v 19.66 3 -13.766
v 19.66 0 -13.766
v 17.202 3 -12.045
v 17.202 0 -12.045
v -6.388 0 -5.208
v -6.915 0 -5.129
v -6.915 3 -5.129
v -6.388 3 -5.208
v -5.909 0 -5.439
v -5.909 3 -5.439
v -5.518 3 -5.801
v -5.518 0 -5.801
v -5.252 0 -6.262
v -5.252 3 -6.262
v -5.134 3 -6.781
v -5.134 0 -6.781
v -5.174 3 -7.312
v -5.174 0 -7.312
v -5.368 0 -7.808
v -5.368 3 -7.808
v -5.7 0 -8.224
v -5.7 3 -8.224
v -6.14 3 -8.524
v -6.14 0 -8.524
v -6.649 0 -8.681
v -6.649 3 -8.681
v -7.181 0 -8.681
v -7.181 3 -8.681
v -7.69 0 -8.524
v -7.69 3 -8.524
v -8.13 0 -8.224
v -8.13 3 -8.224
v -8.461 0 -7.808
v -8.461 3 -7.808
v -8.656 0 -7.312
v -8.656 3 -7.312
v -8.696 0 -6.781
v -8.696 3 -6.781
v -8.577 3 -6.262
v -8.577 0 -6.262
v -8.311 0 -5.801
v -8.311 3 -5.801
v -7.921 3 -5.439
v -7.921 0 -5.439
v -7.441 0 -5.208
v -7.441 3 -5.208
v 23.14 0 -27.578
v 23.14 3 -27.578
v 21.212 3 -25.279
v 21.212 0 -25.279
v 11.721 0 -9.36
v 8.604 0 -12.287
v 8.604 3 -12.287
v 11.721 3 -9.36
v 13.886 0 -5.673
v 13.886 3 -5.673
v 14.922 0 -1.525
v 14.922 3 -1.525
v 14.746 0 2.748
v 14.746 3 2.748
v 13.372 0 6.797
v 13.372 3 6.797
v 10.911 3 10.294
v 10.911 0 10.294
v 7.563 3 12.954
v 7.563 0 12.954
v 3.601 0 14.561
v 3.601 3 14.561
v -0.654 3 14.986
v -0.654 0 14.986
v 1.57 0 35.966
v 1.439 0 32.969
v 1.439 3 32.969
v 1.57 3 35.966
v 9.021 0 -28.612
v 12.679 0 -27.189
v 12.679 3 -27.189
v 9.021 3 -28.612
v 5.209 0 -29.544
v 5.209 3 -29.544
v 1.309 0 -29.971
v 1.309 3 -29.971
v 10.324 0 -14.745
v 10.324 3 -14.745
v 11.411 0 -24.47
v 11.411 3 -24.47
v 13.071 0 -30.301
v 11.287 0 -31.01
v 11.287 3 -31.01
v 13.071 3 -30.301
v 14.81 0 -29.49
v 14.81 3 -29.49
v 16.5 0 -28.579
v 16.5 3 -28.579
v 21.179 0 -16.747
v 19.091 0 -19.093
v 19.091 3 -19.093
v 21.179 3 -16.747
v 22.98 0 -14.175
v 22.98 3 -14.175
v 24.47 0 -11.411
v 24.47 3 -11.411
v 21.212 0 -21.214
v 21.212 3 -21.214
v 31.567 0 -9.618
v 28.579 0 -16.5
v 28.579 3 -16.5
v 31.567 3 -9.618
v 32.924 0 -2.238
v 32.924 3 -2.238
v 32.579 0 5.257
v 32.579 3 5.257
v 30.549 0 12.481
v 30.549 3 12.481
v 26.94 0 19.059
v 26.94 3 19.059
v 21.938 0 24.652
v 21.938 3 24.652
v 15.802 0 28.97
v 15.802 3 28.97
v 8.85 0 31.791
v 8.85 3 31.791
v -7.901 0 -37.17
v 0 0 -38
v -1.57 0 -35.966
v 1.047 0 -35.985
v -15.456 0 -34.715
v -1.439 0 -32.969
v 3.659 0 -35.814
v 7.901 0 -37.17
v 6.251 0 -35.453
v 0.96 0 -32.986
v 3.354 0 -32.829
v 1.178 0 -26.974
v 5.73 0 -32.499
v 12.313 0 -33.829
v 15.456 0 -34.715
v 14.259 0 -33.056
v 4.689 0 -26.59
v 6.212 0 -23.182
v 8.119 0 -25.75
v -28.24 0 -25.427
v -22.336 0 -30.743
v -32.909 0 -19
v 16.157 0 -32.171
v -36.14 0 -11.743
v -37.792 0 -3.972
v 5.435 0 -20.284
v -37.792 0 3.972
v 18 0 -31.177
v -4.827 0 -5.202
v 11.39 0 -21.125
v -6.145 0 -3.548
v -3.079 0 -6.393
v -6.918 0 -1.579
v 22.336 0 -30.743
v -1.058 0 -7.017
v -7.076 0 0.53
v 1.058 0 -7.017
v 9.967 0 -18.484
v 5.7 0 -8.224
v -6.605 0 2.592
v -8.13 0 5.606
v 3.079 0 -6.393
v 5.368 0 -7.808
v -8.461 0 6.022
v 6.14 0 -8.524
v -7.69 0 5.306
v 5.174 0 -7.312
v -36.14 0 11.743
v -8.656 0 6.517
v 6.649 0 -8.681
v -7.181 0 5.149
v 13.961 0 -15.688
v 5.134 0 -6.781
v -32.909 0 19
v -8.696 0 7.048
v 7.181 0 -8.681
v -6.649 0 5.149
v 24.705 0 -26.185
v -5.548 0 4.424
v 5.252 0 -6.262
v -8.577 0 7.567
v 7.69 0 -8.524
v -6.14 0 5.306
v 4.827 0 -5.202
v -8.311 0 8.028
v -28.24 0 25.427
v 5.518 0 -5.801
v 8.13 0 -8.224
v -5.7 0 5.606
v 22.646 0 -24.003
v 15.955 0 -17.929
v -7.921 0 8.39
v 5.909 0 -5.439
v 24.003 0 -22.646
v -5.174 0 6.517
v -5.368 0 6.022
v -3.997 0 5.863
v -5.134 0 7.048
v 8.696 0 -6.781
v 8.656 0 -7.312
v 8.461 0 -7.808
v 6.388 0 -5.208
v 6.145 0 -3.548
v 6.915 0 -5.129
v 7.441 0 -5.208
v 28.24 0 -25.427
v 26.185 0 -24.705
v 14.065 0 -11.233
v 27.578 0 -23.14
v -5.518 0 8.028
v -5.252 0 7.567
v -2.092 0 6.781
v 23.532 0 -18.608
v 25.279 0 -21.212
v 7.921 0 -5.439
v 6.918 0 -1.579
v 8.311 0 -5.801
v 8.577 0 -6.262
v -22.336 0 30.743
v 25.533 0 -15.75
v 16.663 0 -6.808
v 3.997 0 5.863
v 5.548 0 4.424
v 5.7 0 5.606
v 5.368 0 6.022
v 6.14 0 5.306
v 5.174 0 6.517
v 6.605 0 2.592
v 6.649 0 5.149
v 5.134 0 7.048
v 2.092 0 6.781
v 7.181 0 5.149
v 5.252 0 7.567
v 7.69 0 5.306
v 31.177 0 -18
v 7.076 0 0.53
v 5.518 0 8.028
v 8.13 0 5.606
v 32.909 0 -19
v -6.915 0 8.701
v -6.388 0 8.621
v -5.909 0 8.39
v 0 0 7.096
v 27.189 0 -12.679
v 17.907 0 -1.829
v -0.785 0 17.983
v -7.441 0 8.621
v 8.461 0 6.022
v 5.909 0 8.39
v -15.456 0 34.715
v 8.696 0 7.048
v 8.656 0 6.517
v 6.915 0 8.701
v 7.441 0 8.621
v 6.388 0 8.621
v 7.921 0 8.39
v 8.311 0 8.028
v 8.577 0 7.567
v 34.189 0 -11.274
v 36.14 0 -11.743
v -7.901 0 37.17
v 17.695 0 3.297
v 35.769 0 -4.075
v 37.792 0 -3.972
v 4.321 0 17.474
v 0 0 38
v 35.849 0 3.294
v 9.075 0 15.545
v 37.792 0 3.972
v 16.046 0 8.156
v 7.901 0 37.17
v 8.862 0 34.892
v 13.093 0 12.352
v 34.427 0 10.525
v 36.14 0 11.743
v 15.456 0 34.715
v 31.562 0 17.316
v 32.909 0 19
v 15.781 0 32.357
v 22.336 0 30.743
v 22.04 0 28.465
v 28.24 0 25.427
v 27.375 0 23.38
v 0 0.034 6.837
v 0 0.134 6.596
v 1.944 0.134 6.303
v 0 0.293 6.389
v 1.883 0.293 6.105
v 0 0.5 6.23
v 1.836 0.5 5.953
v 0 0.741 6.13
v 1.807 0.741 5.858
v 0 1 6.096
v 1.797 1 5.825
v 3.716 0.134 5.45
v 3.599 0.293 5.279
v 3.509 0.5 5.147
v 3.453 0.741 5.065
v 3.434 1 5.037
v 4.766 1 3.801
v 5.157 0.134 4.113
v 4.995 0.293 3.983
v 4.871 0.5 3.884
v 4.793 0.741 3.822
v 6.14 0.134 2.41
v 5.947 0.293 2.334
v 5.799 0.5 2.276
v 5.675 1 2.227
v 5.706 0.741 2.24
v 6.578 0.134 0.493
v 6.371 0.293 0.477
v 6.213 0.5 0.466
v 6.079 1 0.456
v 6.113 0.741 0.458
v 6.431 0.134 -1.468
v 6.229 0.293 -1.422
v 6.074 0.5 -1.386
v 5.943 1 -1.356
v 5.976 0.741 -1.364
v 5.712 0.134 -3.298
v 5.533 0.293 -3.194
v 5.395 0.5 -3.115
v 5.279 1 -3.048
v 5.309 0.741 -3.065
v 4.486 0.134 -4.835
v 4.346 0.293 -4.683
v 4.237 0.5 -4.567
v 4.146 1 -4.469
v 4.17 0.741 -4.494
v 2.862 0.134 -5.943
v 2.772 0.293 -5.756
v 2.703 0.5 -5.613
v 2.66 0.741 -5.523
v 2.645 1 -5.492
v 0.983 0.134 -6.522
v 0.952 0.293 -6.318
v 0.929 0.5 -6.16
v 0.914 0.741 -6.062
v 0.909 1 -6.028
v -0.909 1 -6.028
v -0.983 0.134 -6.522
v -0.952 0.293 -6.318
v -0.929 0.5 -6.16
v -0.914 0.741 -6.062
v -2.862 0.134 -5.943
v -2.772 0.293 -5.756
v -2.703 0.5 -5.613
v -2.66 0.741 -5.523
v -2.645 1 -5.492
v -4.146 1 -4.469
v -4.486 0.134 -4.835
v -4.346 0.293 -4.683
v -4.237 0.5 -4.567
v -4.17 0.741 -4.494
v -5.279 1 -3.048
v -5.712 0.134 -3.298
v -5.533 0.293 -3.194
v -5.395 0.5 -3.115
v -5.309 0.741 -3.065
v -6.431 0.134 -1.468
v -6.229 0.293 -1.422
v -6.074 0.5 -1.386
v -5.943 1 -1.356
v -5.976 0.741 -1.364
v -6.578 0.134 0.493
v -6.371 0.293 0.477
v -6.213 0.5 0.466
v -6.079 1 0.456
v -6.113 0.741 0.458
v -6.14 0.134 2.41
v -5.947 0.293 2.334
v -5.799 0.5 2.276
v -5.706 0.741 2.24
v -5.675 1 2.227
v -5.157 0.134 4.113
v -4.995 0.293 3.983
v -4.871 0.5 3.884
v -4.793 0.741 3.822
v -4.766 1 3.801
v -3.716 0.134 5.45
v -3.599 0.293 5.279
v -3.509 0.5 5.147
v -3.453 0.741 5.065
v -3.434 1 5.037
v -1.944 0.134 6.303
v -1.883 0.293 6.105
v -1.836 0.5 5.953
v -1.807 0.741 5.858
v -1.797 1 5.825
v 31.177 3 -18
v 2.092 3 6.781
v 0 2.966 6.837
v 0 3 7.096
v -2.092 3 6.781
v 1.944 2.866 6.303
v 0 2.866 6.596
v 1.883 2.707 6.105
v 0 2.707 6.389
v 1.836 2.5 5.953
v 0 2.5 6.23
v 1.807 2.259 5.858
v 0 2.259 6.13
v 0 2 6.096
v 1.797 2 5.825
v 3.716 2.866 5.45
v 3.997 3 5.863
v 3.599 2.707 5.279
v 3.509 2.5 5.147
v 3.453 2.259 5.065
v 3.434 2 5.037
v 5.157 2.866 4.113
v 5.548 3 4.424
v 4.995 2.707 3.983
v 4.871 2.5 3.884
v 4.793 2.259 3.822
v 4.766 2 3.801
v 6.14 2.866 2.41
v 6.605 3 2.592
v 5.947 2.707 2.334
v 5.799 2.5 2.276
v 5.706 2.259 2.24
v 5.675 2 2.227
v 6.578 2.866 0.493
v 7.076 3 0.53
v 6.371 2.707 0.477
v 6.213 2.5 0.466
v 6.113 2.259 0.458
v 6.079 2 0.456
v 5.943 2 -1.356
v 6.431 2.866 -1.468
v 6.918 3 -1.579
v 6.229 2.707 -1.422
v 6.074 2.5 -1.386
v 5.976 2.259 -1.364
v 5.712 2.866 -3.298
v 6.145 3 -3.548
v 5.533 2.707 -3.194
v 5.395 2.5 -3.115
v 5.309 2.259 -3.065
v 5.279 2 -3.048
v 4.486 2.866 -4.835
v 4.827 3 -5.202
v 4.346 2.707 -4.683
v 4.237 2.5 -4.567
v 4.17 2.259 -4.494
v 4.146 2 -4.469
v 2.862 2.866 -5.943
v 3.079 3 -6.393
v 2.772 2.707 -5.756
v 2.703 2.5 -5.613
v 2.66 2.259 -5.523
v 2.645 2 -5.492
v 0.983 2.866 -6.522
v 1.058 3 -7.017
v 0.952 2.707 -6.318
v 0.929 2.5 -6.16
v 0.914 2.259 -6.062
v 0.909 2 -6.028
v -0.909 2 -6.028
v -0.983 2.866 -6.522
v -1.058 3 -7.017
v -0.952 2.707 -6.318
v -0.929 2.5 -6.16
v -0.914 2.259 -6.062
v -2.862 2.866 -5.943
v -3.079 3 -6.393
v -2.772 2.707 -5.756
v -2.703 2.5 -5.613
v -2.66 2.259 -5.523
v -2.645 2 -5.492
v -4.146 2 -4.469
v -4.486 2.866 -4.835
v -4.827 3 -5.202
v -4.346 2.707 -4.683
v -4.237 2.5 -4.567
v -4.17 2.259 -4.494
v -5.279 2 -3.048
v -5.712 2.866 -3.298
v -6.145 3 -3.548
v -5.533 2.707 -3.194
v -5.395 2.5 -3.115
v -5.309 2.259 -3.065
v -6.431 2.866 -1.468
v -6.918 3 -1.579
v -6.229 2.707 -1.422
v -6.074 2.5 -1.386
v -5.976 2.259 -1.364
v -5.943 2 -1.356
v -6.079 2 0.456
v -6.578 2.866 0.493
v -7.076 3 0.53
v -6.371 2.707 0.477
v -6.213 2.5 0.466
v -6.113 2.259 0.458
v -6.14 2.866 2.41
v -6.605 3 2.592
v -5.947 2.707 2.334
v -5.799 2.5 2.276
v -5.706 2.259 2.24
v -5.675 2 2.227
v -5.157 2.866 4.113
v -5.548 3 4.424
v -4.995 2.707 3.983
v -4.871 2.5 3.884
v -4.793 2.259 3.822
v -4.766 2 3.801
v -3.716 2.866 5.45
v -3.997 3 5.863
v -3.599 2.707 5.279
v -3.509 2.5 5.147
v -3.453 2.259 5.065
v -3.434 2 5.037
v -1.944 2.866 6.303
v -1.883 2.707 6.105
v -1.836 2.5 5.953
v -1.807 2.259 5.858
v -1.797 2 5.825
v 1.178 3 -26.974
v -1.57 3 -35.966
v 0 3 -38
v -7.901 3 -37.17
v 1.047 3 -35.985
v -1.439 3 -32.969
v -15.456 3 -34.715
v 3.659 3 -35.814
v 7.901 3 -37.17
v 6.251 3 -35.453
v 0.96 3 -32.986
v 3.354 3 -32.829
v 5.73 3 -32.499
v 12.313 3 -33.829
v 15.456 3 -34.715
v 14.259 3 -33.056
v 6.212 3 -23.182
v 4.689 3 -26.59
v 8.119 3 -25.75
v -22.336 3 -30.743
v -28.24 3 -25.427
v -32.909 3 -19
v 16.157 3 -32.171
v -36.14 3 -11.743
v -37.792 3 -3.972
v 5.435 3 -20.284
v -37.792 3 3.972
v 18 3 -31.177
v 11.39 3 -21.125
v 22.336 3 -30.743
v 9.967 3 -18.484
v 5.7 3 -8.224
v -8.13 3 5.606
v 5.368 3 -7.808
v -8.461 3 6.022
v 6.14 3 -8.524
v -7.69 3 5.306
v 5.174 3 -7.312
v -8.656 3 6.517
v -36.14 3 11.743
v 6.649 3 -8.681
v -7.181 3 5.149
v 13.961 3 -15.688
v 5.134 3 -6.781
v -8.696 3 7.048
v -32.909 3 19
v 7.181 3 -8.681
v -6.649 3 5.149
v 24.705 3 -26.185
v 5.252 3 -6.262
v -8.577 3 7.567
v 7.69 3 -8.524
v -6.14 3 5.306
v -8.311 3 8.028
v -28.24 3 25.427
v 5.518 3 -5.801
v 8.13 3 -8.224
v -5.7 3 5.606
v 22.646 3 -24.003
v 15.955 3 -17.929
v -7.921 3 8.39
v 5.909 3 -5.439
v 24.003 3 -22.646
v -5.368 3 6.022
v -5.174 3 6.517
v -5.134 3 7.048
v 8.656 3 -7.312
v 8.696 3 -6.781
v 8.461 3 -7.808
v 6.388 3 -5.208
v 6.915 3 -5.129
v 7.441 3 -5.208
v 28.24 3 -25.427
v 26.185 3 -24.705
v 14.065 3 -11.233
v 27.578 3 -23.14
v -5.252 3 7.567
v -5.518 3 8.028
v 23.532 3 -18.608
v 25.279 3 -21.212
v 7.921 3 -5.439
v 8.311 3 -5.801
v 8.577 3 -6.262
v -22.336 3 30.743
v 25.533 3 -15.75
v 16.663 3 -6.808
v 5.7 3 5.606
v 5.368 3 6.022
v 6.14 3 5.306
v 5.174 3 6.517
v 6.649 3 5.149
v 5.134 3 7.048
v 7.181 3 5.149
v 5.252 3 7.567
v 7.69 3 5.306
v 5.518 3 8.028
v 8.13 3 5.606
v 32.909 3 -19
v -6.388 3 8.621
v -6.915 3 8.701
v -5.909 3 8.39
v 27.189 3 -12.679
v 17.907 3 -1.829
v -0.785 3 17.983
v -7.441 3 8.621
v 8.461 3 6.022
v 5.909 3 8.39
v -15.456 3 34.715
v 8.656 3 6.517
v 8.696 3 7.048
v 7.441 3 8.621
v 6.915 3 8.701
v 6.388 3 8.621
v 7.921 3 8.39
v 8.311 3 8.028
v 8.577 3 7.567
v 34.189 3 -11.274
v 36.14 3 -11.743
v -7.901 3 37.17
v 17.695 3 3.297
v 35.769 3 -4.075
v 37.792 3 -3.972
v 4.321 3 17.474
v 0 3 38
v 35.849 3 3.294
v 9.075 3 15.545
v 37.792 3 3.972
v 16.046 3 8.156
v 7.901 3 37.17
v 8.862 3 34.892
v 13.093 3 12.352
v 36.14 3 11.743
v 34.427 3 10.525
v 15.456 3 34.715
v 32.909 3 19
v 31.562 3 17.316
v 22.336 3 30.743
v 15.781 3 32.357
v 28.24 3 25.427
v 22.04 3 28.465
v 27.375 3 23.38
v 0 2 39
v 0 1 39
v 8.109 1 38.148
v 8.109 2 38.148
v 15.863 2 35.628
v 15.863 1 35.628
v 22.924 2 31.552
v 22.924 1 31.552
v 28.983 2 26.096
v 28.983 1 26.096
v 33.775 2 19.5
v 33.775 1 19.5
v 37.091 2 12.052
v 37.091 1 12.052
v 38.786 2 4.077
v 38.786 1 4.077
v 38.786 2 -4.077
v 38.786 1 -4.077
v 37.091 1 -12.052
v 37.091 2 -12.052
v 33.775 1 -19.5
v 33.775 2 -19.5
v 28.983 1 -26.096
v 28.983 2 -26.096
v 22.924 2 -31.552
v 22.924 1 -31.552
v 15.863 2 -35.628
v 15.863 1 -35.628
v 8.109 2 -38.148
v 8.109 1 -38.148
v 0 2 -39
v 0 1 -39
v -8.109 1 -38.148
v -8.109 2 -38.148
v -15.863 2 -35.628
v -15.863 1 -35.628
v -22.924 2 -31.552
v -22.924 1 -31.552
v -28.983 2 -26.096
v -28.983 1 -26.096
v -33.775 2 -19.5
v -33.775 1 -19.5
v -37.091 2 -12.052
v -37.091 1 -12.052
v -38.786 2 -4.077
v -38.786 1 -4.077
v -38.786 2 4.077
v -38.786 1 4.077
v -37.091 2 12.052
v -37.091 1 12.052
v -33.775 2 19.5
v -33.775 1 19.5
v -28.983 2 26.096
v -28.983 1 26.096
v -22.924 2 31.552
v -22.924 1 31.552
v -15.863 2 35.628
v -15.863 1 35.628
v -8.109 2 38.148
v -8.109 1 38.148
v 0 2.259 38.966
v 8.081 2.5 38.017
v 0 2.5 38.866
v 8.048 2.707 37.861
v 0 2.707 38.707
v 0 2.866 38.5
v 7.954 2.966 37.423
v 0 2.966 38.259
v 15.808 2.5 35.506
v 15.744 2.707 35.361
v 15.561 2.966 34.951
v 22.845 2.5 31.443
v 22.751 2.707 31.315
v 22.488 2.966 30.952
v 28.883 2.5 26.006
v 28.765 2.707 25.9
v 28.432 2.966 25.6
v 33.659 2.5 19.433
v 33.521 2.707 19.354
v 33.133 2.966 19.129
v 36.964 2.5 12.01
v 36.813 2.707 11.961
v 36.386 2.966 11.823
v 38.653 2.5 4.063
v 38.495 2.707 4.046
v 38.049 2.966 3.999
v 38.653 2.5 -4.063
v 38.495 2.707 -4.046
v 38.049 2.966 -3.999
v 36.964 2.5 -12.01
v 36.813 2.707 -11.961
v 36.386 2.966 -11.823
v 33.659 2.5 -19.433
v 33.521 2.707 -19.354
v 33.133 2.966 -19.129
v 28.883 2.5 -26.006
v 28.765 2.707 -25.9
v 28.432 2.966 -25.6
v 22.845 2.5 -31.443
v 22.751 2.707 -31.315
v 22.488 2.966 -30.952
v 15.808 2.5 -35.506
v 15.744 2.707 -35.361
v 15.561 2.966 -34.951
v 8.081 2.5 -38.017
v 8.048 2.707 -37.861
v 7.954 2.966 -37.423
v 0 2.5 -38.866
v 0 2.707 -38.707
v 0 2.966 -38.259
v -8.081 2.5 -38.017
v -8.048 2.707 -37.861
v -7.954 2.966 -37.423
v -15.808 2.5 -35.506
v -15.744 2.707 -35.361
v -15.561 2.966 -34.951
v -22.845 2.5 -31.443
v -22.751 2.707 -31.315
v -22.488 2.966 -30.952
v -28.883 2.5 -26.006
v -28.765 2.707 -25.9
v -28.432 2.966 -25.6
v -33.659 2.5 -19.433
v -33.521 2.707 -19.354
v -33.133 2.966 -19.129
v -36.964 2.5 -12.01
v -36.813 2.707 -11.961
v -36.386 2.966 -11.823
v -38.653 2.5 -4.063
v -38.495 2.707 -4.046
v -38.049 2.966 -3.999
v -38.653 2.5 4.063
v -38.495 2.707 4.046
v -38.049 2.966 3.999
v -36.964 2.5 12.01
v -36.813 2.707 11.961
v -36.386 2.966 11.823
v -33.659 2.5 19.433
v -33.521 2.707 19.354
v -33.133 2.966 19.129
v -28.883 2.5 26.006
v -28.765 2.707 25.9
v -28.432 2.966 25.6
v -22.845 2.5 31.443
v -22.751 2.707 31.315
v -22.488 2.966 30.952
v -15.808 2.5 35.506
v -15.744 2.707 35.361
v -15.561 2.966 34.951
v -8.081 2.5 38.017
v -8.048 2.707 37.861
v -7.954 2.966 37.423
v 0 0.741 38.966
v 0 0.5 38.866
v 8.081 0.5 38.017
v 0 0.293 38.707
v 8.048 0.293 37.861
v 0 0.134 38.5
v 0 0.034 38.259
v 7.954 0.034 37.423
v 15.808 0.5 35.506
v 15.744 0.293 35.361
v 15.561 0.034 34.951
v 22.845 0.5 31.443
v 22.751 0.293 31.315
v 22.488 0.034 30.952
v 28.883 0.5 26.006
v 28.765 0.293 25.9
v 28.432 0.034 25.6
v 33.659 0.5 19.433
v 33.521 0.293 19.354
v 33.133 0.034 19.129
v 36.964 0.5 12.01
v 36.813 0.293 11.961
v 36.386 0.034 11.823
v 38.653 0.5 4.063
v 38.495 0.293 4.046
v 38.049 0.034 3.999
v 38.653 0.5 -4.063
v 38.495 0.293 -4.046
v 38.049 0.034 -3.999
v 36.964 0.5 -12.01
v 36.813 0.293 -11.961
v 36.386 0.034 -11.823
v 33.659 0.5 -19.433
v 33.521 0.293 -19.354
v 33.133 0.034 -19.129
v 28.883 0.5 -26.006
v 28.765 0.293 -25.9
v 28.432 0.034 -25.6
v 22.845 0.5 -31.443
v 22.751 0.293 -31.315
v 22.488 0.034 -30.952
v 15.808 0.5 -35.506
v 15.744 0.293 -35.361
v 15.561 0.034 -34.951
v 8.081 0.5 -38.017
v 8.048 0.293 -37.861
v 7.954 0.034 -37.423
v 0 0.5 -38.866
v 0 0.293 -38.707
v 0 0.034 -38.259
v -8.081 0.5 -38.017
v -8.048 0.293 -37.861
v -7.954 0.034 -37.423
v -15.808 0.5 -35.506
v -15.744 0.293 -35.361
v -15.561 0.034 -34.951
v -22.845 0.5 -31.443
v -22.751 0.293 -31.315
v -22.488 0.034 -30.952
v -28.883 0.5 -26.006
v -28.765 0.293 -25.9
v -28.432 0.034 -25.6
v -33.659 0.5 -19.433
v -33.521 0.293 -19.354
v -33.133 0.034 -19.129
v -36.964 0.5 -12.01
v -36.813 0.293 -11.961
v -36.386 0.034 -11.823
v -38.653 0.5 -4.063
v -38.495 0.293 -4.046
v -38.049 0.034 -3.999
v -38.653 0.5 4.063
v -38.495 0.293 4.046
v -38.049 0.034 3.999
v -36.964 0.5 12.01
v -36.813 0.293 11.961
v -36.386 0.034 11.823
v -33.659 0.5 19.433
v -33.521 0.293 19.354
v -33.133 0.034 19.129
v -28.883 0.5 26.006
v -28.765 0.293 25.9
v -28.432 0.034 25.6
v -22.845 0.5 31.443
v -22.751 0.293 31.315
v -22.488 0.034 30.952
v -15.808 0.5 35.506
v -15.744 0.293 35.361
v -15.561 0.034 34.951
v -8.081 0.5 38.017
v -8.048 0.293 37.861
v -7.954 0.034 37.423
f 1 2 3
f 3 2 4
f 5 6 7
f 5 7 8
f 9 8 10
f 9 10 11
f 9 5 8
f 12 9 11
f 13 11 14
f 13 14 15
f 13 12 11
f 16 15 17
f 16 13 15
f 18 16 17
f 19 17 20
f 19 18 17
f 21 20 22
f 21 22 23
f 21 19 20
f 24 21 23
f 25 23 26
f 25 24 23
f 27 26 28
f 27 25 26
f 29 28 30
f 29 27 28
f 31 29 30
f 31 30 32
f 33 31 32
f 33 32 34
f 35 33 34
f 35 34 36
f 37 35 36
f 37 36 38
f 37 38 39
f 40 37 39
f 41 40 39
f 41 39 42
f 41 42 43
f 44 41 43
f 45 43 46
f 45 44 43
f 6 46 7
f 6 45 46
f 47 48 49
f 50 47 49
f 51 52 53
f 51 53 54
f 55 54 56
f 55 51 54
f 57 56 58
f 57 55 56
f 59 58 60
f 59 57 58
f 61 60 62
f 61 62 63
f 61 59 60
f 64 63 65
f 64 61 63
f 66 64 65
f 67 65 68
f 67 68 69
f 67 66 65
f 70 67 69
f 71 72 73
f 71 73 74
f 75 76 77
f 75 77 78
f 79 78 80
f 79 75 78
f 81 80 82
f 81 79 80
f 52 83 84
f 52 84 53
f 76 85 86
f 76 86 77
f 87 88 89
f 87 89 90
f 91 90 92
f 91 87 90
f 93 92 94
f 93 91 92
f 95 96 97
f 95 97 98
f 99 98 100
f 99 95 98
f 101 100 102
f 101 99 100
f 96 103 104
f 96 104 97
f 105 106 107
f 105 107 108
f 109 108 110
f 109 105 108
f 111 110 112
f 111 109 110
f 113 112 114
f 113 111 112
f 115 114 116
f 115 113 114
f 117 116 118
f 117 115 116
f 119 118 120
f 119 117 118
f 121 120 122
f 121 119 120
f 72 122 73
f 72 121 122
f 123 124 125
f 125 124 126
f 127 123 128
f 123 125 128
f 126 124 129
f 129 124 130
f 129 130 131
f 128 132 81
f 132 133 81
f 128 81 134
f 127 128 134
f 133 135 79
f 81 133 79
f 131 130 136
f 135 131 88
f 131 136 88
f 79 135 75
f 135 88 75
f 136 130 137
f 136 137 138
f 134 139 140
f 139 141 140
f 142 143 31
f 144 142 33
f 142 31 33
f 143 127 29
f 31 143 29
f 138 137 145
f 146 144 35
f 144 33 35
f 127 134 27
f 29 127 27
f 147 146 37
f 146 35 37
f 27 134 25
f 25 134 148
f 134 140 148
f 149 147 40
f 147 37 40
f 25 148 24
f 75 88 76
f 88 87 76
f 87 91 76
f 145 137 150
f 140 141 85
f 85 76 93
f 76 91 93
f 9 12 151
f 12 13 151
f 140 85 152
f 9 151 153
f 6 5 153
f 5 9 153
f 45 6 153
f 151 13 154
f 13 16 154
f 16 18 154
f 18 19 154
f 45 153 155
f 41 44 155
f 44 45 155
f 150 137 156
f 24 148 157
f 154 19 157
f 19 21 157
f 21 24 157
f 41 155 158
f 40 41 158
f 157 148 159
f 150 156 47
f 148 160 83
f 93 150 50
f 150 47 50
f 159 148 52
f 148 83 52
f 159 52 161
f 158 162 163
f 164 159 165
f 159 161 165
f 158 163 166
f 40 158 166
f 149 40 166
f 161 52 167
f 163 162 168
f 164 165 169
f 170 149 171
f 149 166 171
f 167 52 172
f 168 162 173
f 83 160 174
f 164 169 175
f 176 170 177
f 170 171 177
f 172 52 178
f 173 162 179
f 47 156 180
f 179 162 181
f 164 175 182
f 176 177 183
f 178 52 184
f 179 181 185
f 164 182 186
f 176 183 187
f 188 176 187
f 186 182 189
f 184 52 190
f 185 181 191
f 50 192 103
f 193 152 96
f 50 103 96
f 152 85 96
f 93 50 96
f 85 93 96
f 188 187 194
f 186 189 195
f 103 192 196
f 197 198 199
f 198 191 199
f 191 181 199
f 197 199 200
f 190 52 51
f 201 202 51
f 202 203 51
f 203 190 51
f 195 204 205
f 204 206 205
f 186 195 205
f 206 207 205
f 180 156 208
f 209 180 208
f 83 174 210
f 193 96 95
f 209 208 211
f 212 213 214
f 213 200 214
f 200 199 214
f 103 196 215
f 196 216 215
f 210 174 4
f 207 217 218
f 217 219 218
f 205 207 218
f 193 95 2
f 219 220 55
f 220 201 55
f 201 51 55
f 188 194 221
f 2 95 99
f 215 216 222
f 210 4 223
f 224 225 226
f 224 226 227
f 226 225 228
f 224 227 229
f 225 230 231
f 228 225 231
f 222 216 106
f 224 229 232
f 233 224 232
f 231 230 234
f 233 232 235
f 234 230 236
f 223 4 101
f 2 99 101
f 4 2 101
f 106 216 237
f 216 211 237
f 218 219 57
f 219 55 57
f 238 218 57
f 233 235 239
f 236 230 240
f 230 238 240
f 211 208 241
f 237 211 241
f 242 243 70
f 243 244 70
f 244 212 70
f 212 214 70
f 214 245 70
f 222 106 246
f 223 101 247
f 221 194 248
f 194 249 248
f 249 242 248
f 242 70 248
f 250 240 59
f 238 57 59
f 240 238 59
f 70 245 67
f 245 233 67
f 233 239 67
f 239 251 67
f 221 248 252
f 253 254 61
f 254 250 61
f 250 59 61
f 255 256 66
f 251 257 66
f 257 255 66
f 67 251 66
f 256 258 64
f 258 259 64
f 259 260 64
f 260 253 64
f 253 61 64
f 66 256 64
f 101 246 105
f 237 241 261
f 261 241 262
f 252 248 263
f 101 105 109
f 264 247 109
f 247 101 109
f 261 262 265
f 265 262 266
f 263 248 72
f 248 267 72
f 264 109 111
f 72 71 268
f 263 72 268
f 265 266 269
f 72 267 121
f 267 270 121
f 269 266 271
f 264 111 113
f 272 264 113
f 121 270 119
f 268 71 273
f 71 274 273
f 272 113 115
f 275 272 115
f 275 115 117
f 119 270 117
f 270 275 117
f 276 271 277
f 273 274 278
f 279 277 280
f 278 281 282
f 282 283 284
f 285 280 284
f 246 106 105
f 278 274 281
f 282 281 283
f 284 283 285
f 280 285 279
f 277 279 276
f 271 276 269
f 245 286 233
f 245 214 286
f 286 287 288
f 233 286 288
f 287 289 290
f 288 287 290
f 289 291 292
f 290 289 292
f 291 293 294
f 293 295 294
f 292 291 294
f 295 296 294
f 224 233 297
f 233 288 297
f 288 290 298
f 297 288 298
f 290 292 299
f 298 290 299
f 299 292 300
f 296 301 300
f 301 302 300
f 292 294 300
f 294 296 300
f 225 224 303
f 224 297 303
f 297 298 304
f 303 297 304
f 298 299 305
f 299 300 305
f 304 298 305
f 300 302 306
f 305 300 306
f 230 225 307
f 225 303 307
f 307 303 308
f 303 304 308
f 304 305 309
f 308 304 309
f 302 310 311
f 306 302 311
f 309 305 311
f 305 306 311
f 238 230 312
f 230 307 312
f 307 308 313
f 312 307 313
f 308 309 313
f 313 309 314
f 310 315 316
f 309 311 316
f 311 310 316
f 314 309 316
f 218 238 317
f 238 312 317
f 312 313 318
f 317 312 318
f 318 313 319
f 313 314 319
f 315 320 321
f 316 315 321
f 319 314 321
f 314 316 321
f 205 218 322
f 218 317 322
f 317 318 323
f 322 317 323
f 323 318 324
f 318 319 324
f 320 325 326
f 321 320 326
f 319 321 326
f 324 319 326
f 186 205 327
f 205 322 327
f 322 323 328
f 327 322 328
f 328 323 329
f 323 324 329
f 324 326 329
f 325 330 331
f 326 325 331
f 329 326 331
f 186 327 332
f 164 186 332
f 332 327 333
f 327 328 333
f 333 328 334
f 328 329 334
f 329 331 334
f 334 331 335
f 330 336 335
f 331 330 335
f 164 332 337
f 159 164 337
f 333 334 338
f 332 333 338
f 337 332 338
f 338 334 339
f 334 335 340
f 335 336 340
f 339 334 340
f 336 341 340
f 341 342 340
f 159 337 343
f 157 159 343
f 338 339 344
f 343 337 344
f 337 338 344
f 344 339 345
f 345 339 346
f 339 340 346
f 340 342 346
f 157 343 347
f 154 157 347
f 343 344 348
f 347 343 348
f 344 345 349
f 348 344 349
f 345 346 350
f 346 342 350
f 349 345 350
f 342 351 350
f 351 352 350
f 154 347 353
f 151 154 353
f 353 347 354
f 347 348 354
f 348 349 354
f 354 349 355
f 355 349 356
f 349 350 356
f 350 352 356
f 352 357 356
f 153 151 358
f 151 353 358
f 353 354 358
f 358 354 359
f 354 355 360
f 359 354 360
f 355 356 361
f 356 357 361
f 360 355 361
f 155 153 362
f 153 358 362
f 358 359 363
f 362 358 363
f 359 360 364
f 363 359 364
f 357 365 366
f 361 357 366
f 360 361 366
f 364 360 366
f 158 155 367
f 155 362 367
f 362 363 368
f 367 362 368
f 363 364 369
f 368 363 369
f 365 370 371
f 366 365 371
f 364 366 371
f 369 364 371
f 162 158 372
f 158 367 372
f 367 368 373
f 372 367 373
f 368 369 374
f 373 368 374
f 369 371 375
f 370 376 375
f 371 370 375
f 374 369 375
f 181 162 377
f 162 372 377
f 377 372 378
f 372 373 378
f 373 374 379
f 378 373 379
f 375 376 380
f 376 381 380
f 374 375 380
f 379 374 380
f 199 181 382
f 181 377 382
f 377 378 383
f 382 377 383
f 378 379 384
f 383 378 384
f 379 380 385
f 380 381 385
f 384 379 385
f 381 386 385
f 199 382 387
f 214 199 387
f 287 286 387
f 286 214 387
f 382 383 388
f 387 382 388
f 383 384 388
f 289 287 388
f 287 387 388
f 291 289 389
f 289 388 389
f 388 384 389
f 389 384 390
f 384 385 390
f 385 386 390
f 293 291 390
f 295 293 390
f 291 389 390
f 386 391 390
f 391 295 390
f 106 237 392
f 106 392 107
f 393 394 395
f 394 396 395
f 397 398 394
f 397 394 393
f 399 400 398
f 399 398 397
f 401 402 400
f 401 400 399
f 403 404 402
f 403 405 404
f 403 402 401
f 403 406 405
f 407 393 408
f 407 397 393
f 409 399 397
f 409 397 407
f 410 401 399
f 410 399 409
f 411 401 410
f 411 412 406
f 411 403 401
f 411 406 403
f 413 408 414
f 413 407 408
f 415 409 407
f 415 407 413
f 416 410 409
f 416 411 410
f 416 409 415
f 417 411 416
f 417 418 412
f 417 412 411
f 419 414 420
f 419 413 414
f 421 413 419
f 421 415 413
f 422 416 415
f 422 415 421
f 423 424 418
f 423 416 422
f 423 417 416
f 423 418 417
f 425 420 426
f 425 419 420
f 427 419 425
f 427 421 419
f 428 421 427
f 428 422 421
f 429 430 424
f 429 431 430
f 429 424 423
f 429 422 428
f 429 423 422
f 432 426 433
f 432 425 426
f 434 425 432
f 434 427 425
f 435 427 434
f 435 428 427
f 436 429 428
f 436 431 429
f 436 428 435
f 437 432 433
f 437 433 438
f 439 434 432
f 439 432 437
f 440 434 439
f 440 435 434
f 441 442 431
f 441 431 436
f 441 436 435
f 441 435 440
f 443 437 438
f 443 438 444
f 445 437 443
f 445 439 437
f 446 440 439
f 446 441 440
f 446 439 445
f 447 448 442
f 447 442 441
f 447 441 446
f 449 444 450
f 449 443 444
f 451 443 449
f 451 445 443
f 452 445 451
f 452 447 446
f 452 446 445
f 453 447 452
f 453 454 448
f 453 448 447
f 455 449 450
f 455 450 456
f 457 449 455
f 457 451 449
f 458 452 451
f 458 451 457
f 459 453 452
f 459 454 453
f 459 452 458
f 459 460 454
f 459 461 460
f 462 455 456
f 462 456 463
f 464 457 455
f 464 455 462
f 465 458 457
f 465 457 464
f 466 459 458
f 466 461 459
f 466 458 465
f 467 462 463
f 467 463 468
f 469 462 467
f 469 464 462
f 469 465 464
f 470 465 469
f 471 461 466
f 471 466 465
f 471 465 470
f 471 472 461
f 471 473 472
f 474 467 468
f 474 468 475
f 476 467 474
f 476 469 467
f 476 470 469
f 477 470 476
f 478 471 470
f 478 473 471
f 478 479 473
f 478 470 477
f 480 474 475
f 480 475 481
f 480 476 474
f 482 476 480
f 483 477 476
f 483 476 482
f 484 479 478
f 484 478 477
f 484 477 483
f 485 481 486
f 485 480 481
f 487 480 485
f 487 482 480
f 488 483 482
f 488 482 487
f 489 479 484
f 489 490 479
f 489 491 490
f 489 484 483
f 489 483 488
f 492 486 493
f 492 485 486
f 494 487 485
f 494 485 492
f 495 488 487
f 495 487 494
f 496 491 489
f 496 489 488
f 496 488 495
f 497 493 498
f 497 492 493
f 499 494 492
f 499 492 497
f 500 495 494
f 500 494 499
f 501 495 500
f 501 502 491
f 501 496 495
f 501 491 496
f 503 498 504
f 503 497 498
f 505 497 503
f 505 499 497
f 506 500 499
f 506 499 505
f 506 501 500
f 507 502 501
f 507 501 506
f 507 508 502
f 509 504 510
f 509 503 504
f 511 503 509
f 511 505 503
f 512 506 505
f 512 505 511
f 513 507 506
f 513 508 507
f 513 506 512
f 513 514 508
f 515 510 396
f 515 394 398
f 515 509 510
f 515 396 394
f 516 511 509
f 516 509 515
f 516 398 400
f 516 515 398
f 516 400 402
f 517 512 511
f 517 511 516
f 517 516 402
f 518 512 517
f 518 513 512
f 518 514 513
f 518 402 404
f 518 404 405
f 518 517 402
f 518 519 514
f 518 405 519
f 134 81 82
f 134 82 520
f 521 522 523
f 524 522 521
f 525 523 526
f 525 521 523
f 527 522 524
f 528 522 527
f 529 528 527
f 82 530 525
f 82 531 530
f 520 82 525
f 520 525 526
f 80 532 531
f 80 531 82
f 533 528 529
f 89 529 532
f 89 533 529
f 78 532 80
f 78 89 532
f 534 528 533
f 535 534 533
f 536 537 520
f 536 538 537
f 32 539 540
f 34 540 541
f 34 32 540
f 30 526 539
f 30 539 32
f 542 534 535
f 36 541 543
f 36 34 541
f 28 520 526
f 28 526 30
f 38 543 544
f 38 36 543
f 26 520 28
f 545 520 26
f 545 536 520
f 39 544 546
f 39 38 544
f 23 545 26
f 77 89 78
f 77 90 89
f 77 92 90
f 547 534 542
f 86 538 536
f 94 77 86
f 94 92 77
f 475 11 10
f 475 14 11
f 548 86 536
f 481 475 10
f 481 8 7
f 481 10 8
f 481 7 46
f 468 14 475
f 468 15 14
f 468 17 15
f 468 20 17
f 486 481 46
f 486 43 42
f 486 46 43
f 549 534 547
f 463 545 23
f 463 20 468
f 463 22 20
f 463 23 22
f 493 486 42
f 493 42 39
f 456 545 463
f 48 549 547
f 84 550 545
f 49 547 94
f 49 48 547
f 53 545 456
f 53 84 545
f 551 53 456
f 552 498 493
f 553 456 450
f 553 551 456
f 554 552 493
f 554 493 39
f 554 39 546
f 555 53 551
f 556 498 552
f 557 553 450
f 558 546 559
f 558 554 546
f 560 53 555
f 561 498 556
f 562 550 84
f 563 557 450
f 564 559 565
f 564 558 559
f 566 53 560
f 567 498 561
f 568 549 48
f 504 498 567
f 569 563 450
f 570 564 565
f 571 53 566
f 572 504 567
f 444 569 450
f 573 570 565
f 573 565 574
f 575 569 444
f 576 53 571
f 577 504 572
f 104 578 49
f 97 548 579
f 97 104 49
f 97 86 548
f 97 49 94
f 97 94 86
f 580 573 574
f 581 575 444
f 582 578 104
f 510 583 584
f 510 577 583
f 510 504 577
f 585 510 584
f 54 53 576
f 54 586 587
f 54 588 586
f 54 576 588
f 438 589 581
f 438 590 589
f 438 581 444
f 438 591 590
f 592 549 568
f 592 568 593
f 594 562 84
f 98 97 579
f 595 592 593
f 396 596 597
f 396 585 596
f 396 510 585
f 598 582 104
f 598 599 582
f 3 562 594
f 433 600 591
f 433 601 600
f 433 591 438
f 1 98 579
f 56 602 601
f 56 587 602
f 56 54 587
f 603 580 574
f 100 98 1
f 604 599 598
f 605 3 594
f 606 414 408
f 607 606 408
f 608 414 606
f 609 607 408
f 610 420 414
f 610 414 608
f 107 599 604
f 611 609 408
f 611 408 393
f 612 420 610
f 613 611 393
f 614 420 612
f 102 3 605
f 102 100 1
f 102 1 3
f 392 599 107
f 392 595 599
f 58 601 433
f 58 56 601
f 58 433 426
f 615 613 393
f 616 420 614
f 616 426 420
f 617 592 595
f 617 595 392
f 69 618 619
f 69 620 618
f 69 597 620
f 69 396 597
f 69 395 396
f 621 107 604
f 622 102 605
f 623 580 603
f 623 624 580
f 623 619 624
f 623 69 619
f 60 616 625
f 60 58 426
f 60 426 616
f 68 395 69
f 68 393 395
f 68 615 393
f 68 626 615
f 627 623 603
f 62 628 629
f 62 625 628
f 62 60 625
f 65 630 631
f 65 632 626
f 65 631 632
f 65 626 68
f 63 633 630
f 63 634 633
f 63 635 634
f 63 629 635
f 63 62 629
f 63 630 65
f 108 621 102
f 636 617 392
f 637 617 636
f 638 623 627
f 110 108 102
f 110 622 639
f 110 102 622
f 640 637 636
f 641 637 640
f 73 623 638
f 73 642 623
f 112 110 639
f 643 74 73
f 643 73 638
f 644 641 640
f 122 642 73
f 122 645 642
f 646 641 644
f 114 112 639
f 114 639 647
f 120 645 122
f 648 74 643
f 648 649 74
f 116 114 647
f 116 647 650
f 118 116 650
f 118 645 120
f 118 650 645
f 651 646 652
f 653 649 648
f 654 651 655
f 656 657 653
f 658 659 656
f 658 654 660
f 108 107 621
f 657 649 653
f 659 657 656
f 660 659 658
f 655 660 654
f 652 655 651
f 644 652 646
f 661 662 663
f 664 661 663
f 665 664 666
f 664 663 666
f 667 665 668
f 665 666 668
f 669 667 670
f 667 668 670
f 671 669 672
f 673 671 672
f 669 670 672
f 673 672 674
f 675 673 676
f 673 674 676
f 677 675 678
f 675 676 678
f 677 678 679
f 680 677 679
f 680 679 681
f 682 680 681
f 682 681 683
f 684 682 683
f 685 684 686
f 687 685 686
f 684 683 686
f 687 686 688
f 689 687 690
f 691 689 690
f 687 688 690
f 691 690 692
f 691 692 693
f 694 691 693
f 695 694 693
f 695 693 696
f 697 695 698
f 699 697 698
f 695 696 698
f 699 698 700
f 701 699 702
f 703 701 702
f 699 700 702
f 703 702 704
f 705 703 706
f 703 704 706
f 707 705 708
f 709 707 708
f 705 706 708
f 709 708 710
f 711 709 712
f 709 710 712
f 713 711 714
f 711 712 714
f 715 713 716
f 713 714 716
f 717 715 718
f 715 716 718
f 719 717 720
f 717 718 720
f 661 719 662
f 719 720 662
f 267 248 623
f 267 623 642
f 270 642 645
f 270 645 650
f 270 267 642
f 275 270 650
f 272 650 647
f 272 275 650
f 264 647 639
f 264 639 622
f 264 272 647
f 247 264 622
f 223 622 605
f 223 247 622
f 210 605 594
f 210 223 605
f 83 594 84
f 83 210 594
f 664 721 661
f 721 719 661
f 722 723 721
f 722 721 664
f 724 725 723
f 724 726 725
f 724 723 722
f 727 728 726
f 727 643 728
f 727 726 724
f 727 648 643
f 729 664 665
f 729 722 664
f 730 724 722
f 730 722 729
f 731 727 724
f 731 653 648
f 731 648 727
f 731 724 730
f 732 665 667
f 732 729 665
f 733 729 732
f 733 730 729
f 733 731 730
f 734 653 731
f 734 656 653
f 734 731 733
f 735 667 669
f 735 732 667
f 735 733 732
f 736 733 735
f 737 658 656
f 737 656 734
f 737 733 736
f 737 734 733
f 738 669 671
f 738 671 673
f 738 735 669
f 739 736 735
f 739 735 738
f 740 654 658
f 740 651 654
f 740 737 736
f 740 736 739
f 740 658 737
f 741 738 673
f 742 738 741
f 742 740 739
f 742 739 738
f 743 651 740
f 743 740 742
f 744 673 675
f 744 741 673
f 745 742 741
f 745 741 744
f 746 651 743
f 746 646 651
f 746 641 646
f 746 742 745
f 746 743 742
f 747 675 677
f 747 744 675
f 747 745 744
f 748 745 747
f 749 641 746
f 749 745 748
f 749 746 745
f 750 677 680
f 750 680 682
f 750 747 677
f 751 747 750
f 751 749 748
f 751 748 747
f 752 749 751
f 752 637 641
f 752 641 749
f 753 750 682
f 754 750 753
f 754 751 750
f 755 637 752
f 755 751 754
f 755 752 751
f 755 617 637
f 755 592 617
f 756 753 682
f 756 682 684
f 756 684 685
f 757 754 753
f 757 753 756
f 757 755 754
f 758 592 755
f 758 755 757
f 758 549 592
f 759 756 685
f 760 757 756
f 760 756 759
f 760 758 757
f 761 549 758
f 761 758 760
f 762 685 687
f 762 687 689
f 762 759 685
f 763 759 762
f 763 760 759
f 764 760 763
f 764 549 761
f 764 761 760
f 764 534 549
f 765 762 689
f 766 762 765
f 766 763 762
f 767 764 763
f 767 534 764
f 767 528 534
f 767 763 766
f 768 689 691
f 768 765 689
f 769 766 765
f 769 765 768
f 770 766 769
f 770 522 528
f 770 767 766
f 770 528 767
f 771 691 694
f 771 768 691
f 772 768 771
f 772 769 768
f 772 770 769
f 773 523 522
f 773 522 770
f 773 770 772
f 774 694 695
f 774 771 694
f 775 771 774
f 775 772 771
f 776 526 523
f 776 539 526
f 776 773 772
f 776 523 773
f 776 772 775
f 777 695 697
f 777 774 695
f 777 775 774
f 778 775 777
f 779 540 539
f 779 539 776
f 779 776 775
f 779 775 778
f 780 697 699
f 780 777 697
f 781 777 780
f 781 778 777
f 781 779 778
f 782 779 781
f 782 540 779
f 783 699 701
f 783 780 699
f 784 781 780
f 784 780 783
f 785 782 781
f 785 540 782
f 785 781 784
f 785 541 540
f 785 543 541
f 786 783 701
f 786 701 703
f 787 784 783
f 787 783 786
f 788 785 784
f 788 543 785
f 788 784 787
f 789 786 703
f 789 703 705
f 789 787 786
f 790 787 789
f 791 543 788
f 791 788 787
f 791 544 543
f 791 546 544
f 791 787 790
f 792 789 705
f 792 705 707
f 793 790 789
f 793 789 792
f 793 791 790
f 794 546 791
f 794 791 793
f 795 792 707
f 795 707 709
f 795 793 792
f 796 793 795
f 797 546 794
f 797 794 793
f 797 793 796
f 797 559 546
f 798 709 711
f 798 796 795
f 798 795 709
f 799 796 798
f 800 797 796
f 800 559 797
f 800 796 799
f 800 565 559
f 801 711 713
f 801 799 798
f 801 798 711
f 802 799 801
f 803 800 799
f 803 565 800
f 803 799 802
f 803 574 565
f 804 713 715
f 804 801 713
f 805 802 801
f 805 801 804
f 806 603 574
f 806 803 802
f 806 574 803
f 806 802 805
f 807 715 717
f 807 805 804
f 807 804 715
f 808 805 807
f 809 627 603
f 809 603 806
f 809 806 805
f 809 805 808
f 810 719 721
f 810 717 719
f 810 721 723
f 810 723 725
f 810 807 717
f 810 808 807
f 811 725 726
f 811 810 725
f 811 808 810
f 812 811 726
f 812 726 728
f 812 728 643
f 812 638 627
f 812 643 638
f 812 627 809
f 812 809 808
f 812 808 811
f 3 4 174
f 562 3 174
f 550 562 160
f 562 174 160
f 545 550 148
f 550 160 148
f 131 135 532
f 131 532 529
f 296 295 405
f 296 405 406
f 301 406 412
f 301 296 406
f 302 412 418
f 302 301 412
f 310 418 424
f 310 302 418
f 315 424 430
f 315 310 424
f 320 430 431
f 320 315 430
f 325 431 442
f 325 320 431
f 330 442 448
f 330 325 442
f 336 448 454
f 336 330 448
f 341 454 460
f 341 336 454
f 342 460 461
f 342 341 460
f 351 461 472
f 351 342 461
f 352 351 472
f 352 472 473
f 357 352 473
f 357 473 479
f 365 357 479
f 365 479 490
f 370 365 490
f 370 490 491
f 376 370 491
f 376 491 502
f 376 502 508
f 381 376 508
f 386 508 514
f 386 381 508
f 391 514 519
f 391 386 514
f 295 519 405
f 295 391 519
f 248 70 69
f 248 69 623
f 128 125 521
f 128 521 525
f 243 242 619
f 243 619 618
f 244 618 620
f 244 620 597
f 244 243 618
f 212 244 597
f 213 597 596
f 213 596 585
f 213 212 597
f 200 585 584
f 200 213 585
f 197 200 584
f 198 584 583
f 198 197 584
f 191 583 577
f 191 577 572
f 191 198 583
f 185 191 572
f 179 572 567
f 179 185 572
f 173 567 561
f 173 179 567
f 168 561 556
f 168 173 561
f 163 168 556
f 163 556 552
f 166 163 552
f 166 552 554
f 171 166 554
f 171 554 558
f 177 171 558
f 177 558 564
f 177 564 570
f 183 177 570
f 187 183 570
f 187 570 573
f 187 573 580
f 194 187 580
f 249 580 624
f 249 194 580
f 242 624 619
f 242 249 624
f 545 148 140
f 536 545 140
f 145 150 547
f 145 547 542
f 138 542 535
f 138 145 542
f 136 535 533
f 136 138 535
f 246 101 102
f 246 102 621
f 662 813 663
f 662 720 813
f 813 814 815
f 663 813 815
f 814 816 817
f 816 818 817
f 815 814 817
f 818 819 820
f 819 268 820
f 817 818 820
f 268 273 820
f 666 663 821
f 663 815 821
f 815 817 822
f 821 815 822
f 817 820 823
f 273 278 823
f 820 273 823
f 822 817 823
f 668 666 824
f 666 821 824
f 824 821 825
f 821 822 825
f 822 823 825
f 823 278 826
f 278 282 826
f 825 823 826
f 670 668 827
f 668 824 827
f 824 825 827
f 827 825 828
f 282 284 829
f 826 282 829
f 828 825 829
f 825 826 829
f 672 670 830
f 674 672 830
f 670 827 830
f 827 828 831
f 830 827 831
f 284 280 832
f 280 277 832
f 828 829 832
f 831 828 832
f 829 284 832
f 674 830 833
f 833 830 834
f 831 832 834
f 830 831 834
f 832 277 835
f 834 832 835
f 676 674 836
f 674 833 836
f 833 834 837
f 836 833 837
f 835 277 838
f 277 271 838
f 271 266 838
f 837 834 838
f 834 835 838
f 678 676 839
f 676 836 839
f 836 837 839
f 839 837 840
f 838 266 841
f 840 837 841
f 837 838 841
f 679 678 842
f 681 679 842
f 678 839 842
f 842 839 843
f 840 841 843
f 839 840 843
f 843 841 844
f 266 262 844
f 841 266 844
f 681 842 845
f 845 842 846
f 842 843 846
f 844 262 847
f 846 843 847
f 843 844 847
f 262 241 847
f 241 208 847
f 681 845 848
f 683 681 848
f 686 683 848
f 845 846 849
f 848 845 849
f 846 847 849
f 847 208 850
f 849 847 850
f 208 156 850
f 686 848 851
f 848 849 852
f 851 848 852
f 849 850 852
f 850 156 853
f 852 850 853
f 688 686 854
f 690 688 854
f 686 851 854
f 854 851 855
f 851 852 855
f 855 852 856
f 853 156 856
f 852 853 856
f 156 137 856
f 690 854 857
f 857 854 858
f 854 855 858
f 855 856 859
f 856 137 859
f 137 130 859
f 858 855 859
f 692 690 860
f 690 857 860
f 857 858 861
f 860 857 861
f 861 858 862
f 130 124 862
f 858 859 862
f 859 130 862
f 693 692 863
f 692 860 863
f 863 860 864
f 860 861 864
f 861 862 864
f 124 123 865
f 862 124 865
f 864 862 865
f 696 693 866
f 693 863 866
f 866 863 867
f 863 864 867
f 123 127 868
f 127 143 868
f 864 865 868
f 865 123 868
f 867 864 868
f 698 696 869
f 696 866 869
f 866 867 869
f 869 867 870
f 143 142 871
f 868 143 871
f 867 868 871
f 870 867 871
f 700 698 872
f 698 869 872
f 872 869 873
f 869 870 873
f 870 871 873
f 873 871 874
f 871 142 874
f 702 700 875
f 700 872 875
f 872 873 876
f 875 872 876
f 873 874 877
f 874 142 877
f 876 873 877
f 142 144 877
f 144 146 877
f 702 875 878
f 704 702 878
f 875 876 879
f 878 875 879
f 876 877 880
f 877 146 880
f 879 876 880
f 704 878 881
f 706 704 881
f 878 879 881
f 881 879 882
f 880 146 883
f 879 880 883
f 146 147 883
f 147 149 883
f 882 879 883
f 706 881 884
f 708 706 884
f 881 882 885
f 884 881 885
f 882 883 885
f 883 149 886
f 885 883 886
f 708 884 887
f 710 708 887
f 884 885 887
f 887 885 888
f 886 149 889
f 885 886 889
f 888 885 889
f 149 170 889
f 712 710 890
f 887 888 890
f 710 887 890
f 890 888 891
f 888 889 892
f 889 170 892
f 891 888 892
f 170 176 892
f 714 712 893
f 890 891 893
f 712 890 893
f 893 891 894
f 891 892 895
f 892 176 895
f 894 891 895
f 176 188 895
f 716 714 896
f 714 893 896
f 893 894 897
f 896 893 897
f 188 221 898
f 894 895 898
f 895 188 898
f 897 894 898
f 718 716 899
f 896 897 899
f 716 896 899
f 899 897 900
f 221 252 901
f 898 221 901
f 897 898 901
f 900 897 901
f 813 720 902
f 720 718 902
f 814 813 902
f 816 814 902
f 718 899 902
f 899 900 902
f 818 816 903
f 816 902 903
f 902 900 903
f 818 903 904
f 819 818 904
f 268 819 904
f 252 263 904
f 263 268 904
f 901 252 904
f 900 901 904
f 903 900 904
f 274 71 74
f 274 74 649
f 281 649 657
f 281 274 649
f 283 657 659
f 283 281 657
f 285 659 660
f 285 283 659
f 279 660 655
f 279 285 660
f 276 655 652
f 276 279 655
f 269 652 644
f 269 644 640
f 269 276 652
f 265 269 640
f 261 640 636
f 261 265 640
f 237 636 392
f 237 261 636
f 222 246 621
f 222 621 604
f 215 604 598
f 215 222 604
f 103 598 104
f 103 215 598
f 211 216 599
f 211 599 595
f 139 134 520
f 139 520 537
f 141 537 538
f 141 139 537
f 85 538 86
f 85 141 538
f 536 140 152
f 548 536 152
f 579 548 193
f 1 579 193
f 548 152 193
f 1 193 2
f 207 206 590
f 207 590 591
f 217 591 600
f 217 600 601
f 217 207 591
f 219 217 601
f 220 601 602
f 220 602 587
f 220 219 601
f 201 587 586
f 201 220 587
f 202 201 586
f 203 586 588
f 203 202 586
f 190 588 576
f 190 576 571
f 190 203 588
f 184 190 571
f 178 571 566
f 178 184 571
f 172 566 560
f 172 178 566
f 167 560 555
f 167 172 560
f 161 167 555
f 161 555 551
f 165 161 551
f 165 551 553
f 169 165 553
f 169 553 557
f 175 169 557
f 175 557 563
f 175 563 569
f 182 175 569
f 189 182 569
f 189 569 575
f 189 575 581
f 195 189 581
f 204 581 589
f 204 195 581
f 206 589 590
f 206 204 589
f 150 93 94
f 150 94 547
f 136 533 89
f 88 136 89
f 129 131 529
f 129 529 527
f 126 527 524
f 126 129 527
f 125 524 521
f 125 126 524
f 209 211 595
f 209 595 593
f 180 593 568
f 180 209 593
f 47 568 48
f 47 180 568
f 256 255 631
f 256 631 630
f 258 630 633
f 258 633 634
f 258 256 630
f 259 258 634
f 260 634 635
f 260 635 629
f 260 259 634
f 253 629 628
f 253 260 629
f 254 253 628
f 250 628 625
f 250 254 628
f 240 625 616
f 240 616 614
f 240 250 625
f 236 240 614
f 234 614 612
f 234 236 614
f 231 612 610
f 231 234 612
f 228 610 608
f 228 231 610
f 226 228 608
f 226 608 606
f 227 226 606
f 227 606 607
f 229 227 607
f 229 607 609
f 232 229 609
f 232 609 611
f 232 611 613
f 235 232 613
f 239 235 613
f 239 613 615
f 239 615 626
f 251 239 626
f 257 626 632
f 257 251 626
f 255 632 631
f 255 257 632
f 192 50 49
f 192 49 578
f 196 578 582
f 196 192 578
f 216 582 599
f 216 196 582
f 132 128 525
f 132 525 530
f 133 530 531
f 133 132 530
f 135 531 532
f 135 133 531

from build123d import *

# Parameters (mm, degrees)
SKETCH4_R           = 39
BOSS_EXTRUDE1_DEPTH = 3
CUT_EXTRUDE1_DEPTH  = 3
SKETCH1_R           = 6.096
SKETCH1_R_2         = 1.7859375
CUT_EXTRUDE3_DEPTH  = 3
FILLET1_R           = 1


with BuildPart() as part:
    # Sketch4 → Boss-Extrude1 (new body)
    with BuildSketch(Plane(origin=(0, 0, 0), x_dir=(1, 0, 0), z_dir=(0, 1, 0))):
        with Locations(Location((0, 0, 0), (0, 0, 270))):
            Circle(SKETCH4_R)
    extrude(amount=BOSS_EXTRUDE1_DEPTH)

    # Sketch3 → Cut-Extrude1 (cut)
    with BuildSketch(Plane(origin=(0, 0, 0), x_dir=(1, 0, 0), z_dir=(0, 1, 0))):
        with BuildLine():
            Line((-0.65429081, -14.985723324), (-0.785148973, -17.982867988))
            ThreePointArc((-0.785148973, -17.982867988), (17.044742331, -5.785910375), (10.324375854, 14.744736797))
            Line((10.324375854, 14.744736797), (8.603646545, 12.287280664))
            ThreePointArc((8.603646545, 12.287280664), (14.203951942, -4.82159198), (-0.65429081, -14.985723324))
        make_face()
        with BuildLine():
            Line((1.439439783, -32.968591312), (1.570297945, -35.965735977))
            ThreePointArc((1.570297945, -35.965735977), (31.562163205, -17.315595681), (31.176914536, 18))
            Line((31.176914536, 18), (28.578838325, 16.5))
            ThreePointArc((28.578838325, 16.5), (28.931982938, -15.872629374), (1.439439783, -32.968591312))
        make_face()
        with BuildLine():
            Line((-1.570297945, 35.965735977), (-1.439439783, 32.968591312))
            ThreePointArc((-1.439439783, 32.968591312), (2.158303265, 32.929344467), (5.730389863, 32.498655849))
            Line((5.730389863, 32.498655849), (6.251334396, 35.453079108))
            ThreePointArc((6.251334396, 35.453079108), (2.354512652, 35.922921237), (-1.570297945, 35.965735977))
        make_face()
        with BuildLine():
            Line((12.31272516, 33.828934348), (11.28666473, 31.009856486))
            ThreePointArc((11.28666473, 31.009856486), (13.946402637, 29.908156972), (16.5, 28.578838325))
            Line((16.5, 28.578838325), (18, 31.176914536))
            ThreePointArc((18, 31.176914536), (15.214257423, 32.627080333), (12.31272516, 33.828934348))
        make_face()
        with BuildLine():
            Line((23.140353949, 27.577599952), (21.21199112, 25.279466623))
            ThreePointArc((21.21199112, 25.279466623), (23.334523779, 23.334523779), (25.279466623, 21.21199112))
            Line((25.279466623, 21.21199112), (27.577599952, 23.140353949))
            ThreePointArc((27.577599952, 23.140353949), (25.455844123, 25.455844123), (23.140353949, 27.577599952))
        make_face()
        with BuildLine():
            Line((1.308581621, 29.971446647), (1.177723459, 26.974301983))
            ThreePointArc((1.177723459, 26.974301983), (6.417519093, 26.226235885), (11.410693067, 24.47031025))
            Line((11.410693067, 24.47031025), (12.678547852, 27.189233611))
            ThreePointArc((12.678547852, 27.189233611), (7.13057677, 29.140262094), (1.308581621, 29.971446647))
        make_face()
        with BuildLine():
            Line((21.21199112, 21.214415682), (19.090792008, 19.092974114))
            ThreePointArc((19.090792008, 19.092974114), (22.116662678, 15.487195744), (24.47031025, 11.410693067))
            Line((24.47031025, 11.410693067), (27.189233611, 12.678547852))
            ThreePointArc((27.189233611, 12.678547852), (24.574069642, 17.207995271), (21.21199112, 21.214415682))
        make_face()
        with BuildLine():
            Line((19.659649063, 13.765834472), (17.20219293, 12.045105163))
            ThreePointArc((17.20219293, 12.045105163), (12.045105163, 17.20219293), (5.435199947, 20.284442352))
            Line((5.435199947, 20.284442352), (6.211657082, 23.182219831))
            ThreePointArc((6.211657082, 23.182219831), (13.765834472, 19.659649063), (19.659649063, 13.765834472))
        make_face()
    extrude(amount=CUT_EXTRUDE1_DEPTH, mode=Mode.SUBTRACT)

    # Sketch1 → Cut-Extrude3 (cut)
    with BuildSketch(Plane(origin=(0, 0, 0), x_dir=(1, 0, 0), z_dir=(0, 1, 0))):
        with Locations(Location((0, 0, 0), (0, 0, 270))):
            Circle(SKETCH1_R)
        with Locations(Location((6.914797213, 6.914797213, 0), (0, 0, 270))):
            Circle(SKETCH1_R_2)
        with Locations(Location((6.914797213, -6.914797213, 0), (0, 0, 270))):
            Circle(SKETCH1_R_2)
        with Locations(Location((-6.914797213, -6.914797213, 0), (0, 0, 270))):
            Circle(SKETCH1_R_2)
        with Locations(Location((-6.914797213, 6.914797213, 0), (0, 0, 270))):
            Circle(SKETCH1_R_2)
    extrude(amount=CUT_EXTRUDE3_DEPTH, mode=Mode.SUBTRACT)

    # Fillet1
    fillet1_edges = [part.edges().sort_by_distance(p)[0] for p in [
        (0, 0, -6.096),
        (0, 3, -6.096),
        (0, 0, -39),
        (0, 3, -39),
    ]]
    fillet(fillet1_edges, radius=FILLET1_R)


solid = part.part
